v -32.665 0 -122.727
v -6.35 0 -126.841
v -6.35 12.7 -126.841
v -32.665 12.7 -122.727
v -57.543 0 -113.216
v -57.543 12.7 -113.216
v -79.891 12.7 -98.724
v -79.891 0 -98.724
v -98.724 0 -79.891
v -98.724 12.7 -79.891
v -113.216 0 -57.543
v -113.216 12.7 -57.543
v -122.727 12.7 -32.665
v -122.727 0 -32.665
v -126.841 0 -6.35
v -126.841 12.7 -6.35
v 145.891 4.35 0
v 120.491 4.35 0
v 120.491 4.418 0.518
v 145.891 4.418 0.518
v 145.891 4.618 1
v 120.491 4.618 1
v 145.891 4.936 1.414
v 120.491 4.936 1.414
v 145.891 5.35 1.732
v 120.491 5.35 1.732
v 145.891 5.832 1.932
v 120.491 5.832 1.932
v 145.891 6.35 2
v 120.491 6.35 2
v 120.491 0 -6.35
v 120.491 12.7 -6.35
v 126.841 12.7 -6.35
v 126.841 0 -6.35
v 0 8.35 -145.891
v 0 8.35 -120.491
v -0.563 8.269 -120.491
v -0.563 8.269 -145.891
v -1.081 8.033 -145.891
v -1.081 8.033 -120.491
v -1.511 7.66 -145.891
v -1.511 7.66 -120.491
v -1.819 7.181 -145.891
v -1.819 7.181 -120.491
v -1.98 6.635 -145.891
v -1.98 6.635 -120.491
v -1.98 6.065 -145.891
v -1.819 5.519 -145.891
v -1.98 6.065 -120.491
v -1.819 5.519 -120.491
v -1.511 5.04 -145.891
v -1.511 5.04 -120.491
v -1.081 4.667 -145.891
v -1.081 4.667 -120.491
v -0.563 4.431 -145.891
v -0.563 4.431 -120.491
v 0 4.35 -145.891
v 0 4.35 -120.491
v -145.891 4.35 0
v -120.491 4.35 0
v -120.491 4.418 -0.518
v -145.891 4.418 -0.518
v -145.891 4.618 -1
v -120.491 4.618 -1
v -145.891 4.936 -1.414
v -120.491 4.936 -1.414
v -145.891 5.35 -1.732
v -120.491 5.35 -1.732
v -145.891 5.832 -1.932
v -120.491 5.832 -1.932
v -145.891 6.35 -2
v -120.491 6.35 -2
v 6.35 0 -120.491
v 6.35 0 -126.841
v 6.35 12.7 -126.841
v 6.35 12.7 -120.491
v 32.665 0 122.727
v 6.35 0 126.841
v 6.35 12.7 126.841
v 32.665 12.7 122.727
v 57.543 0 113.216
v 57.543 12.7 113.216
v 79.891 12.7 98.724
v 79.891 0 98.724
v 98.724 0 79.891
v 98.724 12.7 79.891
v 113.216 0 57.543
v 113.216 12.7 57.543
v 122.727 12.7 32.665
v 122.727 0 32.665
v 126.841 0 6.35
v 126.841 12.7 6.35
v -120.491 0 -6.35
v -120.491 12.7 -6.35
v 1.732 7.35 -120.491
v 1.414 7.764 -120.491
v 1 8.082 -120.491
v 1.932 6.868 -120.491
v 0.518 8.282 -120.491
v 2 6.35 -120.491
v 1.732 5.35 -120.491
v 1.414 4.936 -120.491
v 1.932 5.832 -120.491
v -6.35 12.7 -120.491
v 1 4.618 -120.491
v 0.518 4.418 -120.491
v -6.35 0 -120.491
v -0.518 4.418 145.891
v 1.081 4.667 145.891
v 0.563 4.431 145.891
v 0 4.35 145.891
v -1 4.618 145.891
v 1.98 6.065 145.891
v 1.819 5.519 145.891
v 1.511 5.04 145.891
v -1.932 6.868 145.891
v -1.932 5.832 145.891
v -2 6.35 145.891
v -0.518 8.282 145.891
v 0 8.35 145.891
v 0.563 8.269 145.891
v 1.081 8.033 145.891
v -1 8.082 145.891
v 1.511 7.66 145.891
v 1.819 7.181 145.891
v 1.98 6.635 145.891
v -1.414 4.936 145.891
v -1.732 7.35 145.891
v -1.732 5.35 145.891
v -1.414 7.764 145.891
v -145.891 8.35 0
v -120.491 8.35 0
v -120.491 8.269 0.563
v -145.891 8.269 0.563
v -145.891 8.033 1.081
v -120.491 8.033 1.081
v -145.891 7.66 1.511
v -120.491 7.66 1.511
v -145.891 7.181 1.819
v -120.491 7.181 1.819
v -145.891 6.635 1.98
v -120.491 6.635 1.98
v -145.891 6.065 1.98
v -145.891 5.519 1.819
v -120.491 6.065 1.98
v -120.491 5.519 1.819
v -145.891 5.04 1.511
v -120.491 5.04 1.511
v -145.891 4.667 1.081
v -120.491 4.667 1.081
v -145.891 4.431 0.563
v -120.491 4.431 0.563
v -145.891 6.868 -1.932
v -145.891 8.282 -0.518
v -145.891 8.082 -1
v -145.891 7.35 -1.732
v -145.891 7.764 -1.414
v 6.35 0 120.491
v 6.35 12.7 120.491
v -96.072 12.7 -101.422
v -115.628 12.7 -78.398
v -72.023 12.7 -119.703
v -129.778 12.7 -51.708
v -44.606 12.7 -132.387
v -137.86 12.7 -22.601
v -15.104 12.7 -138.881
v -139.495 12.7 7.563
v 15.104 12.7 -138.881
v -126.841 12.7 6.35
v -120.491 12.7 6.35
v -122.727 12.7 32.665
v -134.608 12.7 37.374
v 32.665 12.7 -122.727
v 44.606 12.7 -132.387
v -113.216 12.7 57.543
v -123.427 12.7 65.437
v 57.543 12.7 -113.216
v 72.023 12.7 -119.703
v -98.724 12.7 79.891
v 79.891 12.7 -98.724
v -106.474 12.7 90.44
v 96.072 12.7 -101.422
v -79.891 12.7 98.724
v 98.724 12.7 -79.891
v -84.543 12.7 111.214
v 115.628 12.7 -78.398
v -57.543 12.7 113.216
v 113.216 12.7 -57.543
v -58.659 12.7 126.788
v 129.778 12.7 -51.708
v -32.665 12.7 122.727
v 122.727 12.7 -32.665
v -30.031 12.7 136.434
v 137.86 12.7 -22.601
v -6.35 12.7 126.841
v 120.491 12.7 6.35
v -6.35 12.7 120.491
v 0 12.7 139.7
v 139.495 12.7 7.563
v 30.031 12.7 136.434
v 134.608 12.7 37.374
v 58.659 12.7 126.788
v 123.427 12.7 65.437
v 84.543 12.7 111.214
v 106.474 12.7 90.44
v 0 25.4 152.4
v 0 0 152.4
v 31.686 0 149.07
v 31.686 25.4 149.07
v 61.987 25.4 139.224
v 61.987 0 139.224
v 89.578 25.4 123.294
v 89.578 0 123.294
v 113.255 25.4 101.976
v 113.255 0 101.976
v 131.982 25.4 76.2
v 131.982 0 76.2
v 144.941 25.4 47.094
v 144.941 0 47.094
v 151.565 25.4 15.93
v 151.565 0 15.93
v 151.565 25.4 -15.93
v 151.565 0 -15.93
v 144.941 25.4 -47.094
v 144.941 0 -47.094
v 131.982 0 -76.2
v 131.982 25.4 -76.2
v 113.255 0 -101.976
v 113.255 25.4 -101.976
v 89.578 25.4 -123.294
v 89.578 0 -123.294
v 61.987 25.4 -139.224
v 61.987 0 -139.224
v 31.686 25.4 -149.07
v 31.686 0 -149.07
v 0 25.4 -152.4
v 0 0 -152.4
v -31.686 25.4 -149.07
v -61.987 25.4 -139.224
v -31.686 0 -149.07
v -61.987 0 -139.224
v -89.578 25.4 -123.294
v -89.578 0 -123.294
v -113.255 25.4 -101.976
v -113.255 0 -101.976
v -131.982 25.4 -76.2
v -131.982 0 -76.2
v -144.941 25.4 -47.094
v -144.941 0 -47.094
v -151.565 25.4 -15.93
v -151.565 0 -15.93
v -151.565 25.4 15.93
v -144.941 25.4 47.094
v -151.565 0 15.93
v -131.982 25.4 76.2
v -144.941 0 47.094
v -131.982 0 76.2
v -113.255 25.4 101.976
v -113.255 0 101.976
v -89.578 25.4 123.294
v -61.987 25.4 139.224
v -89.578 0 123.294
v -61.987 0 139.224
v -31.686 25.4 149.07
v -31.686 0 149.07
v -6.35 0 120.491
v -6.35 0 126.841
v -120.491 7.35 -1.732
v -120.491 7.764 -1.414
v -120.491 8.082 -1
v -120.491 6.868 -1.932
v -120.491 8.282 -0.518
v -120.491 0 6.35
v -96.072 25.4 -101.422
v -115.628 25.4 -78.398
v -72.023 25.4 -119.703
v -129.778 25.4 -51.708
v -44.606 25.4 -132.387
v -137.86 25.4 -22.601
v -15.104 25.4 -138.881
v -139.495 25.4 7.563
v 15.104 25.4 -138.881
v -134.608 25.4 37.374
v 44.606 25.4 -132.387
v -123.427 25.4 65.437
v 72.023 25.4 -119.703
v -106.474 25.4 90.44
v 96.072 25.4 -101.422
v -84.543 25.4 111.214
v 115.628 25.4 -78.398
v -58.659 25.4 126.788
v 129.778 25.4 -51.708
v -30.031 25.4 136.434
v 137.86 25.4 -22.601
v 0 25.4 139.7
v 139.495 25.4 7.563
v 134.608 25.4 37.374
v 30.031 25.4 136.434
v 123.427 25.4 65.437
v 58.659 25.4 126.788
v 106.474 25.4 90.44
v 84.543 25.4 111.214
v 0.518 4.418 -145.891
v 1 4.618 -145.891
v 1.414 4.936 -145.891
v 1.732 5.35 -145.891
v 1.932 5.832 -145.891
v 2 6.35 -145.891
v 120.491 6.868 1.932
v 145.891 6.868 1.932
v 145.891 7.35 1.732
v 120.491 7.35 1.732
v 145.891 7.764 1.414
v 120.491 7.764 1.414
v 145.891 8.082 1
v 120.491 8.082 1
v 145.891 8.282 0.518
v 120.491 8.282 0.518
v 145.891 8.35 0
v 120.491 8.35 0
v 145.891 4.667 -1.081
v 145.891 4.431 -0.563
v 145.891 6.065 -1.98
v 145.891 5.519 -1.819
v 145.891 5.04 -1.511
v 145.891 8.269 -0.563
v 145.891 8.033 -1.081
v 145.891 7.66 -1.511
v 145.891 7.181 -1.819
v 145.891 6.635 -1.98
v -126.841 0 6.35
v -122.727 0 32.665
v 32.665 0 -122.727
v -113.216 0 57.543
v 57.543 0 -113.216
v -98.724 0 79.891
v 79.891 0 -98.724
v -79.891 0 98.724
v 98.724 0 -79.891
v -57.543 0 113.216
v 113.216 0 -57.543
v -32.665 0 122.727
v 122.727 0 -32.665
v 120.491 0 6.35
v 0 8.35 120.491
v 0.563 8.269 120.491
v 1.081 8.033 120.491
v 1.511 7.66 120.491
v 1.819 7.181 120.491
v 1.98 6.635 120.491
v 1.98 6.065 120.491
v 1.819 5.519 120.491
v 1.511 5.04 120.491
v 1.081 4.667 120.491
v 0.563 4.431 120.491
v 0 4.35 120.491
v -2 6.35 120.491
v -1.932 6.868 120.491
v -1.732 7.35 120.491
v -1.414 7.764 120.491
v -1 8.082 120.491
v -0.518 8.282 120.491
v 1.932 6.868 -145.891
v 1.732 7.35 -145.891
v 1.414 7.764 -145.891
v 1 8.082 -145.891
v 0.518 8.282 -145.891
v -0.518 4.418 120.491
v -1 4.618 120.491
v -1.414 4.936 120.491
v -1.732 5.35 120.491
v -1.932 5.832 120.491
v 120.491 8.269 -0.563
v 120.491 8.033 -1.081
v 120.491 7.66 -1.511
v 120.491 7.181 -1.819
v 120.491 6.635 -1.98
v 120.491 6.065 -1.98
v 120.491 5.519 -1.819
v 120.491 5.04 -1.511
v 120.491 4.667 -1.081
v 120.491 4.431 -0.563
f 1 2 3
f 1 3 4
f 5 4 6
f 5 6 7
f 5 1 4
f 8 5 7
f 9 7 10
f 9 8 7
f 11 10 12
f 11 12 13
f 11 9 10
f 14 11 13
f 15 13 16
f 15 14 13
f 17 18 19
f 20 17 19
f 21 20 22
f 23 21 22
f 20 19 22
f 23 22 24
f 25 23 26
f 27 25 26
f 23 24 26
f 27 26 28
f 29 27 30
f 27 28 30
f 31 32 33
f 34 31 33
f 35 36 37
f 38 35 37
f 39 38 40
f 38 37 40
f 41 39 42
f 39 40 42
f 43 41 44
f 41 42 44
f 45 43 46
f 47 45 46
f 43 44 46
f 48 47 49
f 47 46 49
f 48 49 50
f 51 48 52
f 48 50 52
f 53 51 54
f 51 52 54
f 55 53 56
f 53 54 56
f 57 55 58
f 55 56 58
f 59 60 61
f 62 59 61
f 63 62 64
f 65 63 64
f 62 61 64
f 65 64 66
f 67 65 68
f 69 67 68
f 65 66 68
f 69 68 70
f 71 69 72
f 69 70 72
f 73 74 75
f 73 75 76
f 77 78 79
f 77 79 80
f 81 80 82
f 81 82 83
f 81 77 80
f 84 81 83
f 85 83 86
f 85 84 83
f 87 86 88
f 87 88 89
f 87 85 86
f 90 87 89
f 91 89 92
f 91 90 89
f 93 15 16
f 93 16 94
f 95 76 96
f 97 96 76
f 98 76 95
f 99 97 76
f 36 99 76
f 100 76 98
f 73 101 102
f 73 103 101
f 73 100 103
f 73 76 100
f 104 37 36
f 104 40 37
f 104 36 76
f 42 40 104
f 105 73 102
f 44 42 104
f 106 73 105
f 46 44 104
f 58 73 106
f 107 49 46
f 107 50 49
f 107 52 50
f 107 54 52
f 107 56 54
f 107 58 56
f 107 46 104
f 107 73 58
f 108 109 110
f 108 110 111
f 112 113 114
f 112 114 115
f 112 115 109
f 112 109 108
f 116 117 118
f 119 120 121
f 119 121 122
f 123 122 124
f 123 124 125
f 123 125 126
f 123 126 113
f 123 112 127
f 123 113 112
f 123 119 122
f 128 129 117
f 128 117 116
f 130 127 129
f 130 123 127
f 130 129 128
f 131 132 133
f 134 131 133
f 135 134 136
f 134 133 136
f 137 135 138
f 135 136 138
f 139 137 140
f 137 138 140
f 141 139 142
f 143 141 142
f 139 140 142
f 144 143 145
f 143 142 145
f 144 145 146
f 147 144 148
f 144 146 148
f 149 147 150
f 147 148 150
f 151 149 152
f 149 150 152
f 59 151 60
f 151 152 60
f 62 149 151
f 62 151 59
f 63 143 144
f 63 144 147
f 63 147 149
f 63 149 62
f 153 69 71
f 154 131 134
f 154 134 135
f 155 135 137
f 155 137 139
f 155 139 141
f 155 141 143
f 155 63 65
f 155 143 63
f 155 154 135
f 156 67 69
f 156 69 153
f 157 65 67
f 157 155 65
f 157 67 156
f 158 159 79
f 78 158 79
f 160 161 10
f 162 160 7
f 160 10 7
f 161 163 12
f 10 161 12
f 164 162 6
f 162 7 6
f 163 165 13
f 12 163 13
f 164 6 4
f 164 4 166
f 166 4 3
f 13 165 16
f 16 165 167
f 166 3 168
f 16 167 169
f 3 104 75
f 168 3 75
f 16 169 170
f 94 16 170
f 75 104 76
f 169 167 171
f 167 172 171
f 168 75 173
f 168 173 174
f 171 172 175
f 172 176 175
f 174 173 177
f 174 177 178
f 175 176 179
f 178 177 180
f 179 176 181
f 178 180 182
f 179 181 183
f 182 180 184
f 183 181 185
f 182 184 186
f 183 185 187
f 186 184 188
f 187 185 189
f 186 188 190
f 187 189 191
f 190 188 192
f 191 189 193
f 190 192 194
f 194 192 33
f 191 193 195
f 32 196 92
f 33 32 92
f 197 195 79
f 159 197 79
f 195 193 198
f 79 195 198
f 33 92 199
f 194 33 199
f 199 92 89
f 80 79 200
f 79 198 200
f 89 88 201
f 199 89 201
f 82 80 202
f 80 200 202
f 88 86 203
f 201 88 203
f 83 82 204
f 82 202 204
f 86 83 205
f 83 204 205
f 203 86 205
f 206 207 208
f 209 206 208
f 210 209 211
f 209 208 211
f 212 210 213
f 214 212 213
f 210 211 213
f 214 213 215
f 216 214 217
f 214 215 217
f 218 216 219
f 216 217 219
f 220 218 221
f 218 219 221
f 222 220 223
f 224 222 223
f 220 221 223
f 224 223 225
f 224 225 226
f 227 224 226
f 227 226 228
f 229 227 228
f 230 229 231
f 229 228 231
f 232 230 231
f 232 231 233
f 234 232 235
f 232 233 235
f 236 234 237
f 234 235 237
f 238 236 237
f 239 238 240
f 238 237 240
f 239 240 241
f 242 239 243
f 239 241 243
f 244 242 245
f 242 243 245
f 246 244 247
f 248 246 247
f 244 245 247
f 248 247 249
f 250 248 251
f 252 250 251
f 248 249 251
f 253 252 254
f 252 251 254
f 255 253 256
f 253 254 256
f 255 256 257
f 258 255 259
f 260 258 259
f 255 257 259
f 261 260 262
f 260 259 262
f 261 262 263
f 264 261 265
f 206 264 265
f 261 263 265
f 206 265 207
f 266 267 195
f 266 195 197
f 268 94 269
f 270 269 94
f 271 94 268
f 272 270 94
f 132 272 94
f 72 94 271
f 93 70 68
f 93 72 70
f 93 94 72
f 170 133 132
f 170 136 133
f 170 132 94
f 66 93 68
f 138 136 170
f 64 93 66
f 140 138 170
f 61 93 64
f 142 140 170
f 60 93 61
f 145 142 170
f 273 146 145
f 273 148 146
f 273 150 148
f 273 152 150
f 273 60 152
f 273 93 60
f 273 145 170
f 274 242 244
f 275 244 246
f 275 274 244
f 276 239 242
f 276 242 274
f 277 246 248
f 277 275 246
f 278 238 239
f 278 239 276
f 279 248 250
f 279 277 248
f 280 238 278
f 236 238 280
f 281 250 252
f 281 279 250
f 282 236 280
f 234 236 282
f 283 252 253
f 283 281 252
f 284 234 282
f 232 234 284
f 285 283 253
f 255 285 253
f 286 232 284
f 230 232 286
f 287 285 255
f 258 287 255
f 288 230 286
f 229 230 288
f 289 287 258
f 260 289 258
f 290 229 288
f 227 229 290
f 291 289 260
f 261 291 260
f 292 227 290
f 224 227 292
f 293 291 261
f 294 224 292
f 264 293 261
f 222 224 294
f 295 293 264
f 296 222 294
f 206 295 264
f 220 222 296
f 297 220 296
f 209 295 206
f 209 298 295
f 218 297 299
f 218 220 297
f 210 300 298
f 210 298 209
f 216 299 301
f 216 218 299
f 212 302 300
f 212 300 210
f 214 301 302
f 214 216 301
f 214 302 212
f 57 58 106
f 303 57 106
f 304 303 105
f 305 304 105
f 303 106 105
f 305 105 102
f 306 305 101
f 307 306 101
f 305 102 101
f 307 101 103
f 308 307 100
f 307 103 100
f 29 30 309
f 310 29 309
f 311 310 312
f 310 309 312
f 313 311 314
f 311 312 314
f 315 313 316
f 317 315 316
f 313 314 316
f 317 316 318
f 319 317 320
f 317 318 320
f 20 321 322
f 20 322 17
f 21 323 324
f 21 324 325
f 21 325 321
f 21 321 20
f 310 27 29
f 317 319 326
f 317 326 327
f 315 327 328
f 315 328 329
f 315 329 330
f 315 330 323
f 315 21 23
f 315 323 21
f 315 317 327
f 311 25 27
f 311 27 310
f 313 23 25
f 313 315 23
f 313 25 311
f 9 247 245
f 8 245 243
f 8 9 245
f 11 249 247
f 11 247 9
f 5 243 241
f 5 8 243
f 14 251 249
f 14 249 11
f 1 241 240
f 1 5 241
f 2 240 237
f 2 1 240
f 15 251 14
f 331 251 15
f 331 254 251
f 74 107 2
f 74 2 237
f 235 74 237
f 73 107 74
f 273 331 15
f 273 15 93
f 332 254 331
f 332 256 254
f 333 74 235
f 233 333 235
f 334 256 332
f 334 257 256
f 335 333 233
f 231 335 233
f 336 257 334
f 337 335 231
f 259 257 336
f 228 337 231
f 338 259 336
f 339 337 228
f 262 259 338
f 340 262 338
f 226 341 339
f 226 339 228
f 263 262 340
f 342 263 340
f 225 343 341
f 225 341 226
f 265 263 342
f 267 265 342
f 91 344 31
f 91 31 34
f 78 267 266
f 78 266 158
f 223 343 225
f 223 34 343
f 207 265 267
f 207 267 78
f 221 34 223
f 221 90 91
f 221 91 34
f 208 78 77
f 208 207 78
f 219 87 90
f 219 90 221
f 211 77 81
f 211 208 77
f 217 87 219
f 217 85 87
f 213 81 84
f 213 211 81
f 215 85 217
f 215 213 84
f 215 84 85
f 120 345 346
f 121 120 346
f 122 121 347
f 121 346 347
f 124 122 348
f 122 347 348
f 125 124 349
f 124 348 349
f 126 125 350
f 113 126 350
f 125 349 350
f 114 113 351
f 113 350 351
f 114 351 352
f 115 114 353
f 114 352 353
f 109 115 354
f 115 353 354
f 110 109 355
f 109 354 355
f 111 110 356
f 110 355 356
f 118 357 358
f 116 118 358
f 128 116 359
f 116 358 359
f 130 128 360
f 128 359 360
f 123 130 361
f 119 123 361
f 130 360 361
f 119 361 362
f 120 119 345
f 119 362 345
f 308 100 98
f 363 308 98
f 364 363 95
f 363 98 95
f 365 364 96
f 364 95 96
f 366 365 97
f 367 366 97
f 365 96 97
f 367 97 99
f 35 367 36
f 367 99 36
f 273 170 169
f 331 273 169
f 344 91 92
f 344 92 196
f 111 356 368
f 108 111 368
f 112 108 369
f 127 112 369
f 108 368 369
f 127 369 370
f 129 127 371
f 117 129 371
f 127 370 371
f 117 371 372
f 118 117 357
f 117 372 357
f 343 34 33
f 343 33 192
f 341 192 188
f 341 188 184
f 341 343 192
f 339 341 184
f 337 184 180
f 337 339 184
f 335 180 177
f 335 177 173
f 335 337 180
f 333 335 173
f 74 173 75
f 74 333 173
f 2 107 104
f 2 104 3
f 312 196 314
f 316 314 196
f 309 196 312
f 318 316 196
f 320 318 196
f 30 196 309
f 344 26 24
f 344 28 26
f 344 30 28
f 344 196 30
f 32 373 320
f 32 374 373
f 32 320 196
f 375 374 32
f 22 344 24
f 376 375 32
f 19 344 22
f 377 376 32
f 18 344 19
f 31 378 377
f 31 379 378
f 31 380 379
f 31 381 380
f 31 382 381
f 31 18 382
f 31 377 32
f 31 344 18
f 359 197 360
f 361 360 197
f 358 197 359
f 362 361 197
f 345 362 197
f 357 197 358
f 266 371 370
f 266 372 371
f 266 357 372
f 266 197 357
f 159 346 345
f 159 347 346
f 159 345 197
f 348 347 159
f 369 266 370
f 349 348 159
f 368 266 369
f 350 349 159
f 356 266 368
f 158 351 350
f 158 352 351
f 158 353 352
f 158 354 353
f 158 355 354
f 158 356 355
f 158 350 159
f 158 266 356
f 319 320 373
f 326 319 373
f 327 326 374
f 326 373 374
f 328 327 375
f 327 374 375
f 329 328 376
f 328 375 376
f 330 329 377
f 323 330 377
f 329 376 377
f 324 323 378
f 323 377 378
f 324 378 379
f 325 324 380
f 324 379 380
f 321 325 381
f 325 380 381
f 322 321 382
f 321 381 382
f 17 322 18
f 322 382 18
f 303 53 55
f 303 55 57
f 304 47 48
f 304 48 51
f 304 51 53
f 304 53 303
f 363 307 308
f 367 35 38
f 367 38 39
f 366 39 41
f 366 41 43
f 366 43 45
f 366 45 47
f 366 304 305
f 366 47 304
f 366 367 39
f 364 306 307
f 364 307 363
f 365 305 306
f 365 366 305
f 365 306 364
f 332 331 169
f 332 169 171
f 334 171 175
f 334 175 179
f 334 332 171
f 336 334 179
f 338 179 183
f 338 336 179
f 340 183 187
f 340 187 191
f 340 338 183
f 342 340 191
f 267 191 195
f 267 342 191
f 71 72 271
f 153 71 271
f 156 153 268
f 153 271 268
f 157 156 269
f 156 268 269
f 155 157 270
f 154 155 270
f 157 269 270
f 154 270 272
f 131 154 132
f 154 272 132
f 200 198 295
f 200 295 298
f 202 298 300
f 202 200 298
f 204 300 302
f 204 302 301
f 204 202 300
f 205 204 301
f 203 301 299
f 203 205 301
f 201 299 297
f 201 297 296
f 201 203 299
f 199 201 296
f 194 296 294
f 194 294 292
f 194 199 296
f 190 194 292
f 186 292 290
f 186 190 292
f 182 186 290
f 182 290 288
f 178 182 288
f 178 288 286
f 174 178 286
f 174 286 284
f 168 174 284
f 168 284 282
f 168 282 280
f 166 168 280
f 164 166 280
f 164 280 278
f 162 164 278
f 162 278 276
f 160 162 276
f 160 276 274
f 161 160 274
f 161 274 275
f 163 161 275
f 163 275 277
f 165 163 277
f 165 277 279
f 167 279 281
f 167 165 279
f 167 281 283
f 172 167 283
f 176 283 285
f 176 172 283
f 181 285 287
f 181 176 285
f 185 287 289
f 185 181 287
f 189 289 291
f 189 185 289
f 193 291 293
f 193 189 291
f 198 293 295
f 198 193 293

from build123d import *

# Parameters (mm, degrees)
SKETCH1_R           = 152.4
SKETCH1_R_2         = 139.7
BOSS_EXTRUDE1_DEPTH = 25.4
SKETCH1_3_R         = 139.7
SKETCH1_3_R_2       = 127
BOSS_EXTRUDE2_DEPTH = 12.7
BOSS_EXTRUDE3_DEPTH = 12.7
SKETCH3_R           = 2
CUT_EXTRUDE1_DEPTH  = 25.4
CIRPATTERN1_COUNT   = 4


with BuildPart() as part:
    # Sketch1 → Boss-Extrude1 (new body)
    with BuildSketch(Plane(origin=(0, 0, 0), x_dir=(1, 0, 0), z_dir=(0, 1, 0))):
        Circle(SKETCH1_R)
        Circle(SKETCH1_R_2, mode=Mode.SUBTRACT)
    extrude(amount=BOSS_EXTRUDE1_DEPTH)

    # Sketch1<3> → Boss-Extrude2 (add)
    with BuildSketch(Plane(origin=(0, 0, 0), x_dir=(1, 0, 0), z_dir=(0, 1, 0))):
        Circle(SKETCH1_3_R)
        Circle(SKETCH1_3_R_2, mode=Mode.SUBTRACT)
    extrude(amount=BOSS_EXTRUDE2_DEPTH)

    # Sketch2 → Boss-Extrude3 (add)
    with BuildSketch(Plane.XZ):
        with BuildLine():
            ThreePointArc((-6.35, -126.841150657), (0, -127), (6.35, -126.841150657))
            Line((6.35, -126.841150657), (6.35, -120.491150657))
            Line((6.35, -120.491150657), (-6.35, -120.491150657))
            Line((-6.35, -120.491150657), (-6.35, -126.841150657))
        make_face()
        with BuildLine():
            ThreePointArc((-126.841150657, 6.35), (-127, 0), (-126.841150657, -6.35))
            Line((-126.841150657, -6.35), (-120.491150657, -6.35))
            Line((-120.491150657, -6.35), (-120.491150657, 6.35))
            Line((-120.491150657, 6.35), (-126.841150657, 6.35))
        make_face()
        with BuildLine():
            Line((120.491150657, -6.35), (126.841150657, -6.35))
            ThreePointArc((126.841150657, -6.35), (127, 0), (126.841150657, 6.35))
            Line((126.841150657, 6.35), (120.491150657, 6.35))
            Line((120.491150657, 6.35), (120.491150657, -6.35))
        make_face()
        with BuildLine():
            ThreePointArc((6.35, 126.841150657), (0, 127), (-6.35, 126.841150657))
            Line((-6.35, 126.841150657), (-6.35, 120.491150657))
            Line((-6.35, 120.491150657), (6.35, 120.491150657))
            Line((6.35, 120.491150657), (6.35, 126.841150657))
        make_face()
    extrude(amount=-BOSS_EXTRUDE3_DEPTH)

    # Sketch3 → Cut-Extrude1 (cut)
    with BuildSketch(Plane(origin=(-120.491150657, 0, 0), x_dir=(0, 0, -1), z_dir=(1, 0, 0))):
        with Locations((0, 6.35)):
            Circle(SKETCH3_R)
    cut_extrude1 = extrude(amount=-CUT_EXTRUDE1_DEPTH, mode=Mode.SUBTRACT)

    # CirPattern1: Cut-Extrude1 ×4 about axis
    cirpattern1_axis = Axis((0, 12.7, 0), (0, 1, 0))
    for i in range(1, CIRPATTERN1_COUNT):
        add(cut_extrude1.rotate(cirpattern1_axis, i * 360 / CIRPATTERN1_COUNT), mode=Mode.SUBTRACT)


solid = part.part
